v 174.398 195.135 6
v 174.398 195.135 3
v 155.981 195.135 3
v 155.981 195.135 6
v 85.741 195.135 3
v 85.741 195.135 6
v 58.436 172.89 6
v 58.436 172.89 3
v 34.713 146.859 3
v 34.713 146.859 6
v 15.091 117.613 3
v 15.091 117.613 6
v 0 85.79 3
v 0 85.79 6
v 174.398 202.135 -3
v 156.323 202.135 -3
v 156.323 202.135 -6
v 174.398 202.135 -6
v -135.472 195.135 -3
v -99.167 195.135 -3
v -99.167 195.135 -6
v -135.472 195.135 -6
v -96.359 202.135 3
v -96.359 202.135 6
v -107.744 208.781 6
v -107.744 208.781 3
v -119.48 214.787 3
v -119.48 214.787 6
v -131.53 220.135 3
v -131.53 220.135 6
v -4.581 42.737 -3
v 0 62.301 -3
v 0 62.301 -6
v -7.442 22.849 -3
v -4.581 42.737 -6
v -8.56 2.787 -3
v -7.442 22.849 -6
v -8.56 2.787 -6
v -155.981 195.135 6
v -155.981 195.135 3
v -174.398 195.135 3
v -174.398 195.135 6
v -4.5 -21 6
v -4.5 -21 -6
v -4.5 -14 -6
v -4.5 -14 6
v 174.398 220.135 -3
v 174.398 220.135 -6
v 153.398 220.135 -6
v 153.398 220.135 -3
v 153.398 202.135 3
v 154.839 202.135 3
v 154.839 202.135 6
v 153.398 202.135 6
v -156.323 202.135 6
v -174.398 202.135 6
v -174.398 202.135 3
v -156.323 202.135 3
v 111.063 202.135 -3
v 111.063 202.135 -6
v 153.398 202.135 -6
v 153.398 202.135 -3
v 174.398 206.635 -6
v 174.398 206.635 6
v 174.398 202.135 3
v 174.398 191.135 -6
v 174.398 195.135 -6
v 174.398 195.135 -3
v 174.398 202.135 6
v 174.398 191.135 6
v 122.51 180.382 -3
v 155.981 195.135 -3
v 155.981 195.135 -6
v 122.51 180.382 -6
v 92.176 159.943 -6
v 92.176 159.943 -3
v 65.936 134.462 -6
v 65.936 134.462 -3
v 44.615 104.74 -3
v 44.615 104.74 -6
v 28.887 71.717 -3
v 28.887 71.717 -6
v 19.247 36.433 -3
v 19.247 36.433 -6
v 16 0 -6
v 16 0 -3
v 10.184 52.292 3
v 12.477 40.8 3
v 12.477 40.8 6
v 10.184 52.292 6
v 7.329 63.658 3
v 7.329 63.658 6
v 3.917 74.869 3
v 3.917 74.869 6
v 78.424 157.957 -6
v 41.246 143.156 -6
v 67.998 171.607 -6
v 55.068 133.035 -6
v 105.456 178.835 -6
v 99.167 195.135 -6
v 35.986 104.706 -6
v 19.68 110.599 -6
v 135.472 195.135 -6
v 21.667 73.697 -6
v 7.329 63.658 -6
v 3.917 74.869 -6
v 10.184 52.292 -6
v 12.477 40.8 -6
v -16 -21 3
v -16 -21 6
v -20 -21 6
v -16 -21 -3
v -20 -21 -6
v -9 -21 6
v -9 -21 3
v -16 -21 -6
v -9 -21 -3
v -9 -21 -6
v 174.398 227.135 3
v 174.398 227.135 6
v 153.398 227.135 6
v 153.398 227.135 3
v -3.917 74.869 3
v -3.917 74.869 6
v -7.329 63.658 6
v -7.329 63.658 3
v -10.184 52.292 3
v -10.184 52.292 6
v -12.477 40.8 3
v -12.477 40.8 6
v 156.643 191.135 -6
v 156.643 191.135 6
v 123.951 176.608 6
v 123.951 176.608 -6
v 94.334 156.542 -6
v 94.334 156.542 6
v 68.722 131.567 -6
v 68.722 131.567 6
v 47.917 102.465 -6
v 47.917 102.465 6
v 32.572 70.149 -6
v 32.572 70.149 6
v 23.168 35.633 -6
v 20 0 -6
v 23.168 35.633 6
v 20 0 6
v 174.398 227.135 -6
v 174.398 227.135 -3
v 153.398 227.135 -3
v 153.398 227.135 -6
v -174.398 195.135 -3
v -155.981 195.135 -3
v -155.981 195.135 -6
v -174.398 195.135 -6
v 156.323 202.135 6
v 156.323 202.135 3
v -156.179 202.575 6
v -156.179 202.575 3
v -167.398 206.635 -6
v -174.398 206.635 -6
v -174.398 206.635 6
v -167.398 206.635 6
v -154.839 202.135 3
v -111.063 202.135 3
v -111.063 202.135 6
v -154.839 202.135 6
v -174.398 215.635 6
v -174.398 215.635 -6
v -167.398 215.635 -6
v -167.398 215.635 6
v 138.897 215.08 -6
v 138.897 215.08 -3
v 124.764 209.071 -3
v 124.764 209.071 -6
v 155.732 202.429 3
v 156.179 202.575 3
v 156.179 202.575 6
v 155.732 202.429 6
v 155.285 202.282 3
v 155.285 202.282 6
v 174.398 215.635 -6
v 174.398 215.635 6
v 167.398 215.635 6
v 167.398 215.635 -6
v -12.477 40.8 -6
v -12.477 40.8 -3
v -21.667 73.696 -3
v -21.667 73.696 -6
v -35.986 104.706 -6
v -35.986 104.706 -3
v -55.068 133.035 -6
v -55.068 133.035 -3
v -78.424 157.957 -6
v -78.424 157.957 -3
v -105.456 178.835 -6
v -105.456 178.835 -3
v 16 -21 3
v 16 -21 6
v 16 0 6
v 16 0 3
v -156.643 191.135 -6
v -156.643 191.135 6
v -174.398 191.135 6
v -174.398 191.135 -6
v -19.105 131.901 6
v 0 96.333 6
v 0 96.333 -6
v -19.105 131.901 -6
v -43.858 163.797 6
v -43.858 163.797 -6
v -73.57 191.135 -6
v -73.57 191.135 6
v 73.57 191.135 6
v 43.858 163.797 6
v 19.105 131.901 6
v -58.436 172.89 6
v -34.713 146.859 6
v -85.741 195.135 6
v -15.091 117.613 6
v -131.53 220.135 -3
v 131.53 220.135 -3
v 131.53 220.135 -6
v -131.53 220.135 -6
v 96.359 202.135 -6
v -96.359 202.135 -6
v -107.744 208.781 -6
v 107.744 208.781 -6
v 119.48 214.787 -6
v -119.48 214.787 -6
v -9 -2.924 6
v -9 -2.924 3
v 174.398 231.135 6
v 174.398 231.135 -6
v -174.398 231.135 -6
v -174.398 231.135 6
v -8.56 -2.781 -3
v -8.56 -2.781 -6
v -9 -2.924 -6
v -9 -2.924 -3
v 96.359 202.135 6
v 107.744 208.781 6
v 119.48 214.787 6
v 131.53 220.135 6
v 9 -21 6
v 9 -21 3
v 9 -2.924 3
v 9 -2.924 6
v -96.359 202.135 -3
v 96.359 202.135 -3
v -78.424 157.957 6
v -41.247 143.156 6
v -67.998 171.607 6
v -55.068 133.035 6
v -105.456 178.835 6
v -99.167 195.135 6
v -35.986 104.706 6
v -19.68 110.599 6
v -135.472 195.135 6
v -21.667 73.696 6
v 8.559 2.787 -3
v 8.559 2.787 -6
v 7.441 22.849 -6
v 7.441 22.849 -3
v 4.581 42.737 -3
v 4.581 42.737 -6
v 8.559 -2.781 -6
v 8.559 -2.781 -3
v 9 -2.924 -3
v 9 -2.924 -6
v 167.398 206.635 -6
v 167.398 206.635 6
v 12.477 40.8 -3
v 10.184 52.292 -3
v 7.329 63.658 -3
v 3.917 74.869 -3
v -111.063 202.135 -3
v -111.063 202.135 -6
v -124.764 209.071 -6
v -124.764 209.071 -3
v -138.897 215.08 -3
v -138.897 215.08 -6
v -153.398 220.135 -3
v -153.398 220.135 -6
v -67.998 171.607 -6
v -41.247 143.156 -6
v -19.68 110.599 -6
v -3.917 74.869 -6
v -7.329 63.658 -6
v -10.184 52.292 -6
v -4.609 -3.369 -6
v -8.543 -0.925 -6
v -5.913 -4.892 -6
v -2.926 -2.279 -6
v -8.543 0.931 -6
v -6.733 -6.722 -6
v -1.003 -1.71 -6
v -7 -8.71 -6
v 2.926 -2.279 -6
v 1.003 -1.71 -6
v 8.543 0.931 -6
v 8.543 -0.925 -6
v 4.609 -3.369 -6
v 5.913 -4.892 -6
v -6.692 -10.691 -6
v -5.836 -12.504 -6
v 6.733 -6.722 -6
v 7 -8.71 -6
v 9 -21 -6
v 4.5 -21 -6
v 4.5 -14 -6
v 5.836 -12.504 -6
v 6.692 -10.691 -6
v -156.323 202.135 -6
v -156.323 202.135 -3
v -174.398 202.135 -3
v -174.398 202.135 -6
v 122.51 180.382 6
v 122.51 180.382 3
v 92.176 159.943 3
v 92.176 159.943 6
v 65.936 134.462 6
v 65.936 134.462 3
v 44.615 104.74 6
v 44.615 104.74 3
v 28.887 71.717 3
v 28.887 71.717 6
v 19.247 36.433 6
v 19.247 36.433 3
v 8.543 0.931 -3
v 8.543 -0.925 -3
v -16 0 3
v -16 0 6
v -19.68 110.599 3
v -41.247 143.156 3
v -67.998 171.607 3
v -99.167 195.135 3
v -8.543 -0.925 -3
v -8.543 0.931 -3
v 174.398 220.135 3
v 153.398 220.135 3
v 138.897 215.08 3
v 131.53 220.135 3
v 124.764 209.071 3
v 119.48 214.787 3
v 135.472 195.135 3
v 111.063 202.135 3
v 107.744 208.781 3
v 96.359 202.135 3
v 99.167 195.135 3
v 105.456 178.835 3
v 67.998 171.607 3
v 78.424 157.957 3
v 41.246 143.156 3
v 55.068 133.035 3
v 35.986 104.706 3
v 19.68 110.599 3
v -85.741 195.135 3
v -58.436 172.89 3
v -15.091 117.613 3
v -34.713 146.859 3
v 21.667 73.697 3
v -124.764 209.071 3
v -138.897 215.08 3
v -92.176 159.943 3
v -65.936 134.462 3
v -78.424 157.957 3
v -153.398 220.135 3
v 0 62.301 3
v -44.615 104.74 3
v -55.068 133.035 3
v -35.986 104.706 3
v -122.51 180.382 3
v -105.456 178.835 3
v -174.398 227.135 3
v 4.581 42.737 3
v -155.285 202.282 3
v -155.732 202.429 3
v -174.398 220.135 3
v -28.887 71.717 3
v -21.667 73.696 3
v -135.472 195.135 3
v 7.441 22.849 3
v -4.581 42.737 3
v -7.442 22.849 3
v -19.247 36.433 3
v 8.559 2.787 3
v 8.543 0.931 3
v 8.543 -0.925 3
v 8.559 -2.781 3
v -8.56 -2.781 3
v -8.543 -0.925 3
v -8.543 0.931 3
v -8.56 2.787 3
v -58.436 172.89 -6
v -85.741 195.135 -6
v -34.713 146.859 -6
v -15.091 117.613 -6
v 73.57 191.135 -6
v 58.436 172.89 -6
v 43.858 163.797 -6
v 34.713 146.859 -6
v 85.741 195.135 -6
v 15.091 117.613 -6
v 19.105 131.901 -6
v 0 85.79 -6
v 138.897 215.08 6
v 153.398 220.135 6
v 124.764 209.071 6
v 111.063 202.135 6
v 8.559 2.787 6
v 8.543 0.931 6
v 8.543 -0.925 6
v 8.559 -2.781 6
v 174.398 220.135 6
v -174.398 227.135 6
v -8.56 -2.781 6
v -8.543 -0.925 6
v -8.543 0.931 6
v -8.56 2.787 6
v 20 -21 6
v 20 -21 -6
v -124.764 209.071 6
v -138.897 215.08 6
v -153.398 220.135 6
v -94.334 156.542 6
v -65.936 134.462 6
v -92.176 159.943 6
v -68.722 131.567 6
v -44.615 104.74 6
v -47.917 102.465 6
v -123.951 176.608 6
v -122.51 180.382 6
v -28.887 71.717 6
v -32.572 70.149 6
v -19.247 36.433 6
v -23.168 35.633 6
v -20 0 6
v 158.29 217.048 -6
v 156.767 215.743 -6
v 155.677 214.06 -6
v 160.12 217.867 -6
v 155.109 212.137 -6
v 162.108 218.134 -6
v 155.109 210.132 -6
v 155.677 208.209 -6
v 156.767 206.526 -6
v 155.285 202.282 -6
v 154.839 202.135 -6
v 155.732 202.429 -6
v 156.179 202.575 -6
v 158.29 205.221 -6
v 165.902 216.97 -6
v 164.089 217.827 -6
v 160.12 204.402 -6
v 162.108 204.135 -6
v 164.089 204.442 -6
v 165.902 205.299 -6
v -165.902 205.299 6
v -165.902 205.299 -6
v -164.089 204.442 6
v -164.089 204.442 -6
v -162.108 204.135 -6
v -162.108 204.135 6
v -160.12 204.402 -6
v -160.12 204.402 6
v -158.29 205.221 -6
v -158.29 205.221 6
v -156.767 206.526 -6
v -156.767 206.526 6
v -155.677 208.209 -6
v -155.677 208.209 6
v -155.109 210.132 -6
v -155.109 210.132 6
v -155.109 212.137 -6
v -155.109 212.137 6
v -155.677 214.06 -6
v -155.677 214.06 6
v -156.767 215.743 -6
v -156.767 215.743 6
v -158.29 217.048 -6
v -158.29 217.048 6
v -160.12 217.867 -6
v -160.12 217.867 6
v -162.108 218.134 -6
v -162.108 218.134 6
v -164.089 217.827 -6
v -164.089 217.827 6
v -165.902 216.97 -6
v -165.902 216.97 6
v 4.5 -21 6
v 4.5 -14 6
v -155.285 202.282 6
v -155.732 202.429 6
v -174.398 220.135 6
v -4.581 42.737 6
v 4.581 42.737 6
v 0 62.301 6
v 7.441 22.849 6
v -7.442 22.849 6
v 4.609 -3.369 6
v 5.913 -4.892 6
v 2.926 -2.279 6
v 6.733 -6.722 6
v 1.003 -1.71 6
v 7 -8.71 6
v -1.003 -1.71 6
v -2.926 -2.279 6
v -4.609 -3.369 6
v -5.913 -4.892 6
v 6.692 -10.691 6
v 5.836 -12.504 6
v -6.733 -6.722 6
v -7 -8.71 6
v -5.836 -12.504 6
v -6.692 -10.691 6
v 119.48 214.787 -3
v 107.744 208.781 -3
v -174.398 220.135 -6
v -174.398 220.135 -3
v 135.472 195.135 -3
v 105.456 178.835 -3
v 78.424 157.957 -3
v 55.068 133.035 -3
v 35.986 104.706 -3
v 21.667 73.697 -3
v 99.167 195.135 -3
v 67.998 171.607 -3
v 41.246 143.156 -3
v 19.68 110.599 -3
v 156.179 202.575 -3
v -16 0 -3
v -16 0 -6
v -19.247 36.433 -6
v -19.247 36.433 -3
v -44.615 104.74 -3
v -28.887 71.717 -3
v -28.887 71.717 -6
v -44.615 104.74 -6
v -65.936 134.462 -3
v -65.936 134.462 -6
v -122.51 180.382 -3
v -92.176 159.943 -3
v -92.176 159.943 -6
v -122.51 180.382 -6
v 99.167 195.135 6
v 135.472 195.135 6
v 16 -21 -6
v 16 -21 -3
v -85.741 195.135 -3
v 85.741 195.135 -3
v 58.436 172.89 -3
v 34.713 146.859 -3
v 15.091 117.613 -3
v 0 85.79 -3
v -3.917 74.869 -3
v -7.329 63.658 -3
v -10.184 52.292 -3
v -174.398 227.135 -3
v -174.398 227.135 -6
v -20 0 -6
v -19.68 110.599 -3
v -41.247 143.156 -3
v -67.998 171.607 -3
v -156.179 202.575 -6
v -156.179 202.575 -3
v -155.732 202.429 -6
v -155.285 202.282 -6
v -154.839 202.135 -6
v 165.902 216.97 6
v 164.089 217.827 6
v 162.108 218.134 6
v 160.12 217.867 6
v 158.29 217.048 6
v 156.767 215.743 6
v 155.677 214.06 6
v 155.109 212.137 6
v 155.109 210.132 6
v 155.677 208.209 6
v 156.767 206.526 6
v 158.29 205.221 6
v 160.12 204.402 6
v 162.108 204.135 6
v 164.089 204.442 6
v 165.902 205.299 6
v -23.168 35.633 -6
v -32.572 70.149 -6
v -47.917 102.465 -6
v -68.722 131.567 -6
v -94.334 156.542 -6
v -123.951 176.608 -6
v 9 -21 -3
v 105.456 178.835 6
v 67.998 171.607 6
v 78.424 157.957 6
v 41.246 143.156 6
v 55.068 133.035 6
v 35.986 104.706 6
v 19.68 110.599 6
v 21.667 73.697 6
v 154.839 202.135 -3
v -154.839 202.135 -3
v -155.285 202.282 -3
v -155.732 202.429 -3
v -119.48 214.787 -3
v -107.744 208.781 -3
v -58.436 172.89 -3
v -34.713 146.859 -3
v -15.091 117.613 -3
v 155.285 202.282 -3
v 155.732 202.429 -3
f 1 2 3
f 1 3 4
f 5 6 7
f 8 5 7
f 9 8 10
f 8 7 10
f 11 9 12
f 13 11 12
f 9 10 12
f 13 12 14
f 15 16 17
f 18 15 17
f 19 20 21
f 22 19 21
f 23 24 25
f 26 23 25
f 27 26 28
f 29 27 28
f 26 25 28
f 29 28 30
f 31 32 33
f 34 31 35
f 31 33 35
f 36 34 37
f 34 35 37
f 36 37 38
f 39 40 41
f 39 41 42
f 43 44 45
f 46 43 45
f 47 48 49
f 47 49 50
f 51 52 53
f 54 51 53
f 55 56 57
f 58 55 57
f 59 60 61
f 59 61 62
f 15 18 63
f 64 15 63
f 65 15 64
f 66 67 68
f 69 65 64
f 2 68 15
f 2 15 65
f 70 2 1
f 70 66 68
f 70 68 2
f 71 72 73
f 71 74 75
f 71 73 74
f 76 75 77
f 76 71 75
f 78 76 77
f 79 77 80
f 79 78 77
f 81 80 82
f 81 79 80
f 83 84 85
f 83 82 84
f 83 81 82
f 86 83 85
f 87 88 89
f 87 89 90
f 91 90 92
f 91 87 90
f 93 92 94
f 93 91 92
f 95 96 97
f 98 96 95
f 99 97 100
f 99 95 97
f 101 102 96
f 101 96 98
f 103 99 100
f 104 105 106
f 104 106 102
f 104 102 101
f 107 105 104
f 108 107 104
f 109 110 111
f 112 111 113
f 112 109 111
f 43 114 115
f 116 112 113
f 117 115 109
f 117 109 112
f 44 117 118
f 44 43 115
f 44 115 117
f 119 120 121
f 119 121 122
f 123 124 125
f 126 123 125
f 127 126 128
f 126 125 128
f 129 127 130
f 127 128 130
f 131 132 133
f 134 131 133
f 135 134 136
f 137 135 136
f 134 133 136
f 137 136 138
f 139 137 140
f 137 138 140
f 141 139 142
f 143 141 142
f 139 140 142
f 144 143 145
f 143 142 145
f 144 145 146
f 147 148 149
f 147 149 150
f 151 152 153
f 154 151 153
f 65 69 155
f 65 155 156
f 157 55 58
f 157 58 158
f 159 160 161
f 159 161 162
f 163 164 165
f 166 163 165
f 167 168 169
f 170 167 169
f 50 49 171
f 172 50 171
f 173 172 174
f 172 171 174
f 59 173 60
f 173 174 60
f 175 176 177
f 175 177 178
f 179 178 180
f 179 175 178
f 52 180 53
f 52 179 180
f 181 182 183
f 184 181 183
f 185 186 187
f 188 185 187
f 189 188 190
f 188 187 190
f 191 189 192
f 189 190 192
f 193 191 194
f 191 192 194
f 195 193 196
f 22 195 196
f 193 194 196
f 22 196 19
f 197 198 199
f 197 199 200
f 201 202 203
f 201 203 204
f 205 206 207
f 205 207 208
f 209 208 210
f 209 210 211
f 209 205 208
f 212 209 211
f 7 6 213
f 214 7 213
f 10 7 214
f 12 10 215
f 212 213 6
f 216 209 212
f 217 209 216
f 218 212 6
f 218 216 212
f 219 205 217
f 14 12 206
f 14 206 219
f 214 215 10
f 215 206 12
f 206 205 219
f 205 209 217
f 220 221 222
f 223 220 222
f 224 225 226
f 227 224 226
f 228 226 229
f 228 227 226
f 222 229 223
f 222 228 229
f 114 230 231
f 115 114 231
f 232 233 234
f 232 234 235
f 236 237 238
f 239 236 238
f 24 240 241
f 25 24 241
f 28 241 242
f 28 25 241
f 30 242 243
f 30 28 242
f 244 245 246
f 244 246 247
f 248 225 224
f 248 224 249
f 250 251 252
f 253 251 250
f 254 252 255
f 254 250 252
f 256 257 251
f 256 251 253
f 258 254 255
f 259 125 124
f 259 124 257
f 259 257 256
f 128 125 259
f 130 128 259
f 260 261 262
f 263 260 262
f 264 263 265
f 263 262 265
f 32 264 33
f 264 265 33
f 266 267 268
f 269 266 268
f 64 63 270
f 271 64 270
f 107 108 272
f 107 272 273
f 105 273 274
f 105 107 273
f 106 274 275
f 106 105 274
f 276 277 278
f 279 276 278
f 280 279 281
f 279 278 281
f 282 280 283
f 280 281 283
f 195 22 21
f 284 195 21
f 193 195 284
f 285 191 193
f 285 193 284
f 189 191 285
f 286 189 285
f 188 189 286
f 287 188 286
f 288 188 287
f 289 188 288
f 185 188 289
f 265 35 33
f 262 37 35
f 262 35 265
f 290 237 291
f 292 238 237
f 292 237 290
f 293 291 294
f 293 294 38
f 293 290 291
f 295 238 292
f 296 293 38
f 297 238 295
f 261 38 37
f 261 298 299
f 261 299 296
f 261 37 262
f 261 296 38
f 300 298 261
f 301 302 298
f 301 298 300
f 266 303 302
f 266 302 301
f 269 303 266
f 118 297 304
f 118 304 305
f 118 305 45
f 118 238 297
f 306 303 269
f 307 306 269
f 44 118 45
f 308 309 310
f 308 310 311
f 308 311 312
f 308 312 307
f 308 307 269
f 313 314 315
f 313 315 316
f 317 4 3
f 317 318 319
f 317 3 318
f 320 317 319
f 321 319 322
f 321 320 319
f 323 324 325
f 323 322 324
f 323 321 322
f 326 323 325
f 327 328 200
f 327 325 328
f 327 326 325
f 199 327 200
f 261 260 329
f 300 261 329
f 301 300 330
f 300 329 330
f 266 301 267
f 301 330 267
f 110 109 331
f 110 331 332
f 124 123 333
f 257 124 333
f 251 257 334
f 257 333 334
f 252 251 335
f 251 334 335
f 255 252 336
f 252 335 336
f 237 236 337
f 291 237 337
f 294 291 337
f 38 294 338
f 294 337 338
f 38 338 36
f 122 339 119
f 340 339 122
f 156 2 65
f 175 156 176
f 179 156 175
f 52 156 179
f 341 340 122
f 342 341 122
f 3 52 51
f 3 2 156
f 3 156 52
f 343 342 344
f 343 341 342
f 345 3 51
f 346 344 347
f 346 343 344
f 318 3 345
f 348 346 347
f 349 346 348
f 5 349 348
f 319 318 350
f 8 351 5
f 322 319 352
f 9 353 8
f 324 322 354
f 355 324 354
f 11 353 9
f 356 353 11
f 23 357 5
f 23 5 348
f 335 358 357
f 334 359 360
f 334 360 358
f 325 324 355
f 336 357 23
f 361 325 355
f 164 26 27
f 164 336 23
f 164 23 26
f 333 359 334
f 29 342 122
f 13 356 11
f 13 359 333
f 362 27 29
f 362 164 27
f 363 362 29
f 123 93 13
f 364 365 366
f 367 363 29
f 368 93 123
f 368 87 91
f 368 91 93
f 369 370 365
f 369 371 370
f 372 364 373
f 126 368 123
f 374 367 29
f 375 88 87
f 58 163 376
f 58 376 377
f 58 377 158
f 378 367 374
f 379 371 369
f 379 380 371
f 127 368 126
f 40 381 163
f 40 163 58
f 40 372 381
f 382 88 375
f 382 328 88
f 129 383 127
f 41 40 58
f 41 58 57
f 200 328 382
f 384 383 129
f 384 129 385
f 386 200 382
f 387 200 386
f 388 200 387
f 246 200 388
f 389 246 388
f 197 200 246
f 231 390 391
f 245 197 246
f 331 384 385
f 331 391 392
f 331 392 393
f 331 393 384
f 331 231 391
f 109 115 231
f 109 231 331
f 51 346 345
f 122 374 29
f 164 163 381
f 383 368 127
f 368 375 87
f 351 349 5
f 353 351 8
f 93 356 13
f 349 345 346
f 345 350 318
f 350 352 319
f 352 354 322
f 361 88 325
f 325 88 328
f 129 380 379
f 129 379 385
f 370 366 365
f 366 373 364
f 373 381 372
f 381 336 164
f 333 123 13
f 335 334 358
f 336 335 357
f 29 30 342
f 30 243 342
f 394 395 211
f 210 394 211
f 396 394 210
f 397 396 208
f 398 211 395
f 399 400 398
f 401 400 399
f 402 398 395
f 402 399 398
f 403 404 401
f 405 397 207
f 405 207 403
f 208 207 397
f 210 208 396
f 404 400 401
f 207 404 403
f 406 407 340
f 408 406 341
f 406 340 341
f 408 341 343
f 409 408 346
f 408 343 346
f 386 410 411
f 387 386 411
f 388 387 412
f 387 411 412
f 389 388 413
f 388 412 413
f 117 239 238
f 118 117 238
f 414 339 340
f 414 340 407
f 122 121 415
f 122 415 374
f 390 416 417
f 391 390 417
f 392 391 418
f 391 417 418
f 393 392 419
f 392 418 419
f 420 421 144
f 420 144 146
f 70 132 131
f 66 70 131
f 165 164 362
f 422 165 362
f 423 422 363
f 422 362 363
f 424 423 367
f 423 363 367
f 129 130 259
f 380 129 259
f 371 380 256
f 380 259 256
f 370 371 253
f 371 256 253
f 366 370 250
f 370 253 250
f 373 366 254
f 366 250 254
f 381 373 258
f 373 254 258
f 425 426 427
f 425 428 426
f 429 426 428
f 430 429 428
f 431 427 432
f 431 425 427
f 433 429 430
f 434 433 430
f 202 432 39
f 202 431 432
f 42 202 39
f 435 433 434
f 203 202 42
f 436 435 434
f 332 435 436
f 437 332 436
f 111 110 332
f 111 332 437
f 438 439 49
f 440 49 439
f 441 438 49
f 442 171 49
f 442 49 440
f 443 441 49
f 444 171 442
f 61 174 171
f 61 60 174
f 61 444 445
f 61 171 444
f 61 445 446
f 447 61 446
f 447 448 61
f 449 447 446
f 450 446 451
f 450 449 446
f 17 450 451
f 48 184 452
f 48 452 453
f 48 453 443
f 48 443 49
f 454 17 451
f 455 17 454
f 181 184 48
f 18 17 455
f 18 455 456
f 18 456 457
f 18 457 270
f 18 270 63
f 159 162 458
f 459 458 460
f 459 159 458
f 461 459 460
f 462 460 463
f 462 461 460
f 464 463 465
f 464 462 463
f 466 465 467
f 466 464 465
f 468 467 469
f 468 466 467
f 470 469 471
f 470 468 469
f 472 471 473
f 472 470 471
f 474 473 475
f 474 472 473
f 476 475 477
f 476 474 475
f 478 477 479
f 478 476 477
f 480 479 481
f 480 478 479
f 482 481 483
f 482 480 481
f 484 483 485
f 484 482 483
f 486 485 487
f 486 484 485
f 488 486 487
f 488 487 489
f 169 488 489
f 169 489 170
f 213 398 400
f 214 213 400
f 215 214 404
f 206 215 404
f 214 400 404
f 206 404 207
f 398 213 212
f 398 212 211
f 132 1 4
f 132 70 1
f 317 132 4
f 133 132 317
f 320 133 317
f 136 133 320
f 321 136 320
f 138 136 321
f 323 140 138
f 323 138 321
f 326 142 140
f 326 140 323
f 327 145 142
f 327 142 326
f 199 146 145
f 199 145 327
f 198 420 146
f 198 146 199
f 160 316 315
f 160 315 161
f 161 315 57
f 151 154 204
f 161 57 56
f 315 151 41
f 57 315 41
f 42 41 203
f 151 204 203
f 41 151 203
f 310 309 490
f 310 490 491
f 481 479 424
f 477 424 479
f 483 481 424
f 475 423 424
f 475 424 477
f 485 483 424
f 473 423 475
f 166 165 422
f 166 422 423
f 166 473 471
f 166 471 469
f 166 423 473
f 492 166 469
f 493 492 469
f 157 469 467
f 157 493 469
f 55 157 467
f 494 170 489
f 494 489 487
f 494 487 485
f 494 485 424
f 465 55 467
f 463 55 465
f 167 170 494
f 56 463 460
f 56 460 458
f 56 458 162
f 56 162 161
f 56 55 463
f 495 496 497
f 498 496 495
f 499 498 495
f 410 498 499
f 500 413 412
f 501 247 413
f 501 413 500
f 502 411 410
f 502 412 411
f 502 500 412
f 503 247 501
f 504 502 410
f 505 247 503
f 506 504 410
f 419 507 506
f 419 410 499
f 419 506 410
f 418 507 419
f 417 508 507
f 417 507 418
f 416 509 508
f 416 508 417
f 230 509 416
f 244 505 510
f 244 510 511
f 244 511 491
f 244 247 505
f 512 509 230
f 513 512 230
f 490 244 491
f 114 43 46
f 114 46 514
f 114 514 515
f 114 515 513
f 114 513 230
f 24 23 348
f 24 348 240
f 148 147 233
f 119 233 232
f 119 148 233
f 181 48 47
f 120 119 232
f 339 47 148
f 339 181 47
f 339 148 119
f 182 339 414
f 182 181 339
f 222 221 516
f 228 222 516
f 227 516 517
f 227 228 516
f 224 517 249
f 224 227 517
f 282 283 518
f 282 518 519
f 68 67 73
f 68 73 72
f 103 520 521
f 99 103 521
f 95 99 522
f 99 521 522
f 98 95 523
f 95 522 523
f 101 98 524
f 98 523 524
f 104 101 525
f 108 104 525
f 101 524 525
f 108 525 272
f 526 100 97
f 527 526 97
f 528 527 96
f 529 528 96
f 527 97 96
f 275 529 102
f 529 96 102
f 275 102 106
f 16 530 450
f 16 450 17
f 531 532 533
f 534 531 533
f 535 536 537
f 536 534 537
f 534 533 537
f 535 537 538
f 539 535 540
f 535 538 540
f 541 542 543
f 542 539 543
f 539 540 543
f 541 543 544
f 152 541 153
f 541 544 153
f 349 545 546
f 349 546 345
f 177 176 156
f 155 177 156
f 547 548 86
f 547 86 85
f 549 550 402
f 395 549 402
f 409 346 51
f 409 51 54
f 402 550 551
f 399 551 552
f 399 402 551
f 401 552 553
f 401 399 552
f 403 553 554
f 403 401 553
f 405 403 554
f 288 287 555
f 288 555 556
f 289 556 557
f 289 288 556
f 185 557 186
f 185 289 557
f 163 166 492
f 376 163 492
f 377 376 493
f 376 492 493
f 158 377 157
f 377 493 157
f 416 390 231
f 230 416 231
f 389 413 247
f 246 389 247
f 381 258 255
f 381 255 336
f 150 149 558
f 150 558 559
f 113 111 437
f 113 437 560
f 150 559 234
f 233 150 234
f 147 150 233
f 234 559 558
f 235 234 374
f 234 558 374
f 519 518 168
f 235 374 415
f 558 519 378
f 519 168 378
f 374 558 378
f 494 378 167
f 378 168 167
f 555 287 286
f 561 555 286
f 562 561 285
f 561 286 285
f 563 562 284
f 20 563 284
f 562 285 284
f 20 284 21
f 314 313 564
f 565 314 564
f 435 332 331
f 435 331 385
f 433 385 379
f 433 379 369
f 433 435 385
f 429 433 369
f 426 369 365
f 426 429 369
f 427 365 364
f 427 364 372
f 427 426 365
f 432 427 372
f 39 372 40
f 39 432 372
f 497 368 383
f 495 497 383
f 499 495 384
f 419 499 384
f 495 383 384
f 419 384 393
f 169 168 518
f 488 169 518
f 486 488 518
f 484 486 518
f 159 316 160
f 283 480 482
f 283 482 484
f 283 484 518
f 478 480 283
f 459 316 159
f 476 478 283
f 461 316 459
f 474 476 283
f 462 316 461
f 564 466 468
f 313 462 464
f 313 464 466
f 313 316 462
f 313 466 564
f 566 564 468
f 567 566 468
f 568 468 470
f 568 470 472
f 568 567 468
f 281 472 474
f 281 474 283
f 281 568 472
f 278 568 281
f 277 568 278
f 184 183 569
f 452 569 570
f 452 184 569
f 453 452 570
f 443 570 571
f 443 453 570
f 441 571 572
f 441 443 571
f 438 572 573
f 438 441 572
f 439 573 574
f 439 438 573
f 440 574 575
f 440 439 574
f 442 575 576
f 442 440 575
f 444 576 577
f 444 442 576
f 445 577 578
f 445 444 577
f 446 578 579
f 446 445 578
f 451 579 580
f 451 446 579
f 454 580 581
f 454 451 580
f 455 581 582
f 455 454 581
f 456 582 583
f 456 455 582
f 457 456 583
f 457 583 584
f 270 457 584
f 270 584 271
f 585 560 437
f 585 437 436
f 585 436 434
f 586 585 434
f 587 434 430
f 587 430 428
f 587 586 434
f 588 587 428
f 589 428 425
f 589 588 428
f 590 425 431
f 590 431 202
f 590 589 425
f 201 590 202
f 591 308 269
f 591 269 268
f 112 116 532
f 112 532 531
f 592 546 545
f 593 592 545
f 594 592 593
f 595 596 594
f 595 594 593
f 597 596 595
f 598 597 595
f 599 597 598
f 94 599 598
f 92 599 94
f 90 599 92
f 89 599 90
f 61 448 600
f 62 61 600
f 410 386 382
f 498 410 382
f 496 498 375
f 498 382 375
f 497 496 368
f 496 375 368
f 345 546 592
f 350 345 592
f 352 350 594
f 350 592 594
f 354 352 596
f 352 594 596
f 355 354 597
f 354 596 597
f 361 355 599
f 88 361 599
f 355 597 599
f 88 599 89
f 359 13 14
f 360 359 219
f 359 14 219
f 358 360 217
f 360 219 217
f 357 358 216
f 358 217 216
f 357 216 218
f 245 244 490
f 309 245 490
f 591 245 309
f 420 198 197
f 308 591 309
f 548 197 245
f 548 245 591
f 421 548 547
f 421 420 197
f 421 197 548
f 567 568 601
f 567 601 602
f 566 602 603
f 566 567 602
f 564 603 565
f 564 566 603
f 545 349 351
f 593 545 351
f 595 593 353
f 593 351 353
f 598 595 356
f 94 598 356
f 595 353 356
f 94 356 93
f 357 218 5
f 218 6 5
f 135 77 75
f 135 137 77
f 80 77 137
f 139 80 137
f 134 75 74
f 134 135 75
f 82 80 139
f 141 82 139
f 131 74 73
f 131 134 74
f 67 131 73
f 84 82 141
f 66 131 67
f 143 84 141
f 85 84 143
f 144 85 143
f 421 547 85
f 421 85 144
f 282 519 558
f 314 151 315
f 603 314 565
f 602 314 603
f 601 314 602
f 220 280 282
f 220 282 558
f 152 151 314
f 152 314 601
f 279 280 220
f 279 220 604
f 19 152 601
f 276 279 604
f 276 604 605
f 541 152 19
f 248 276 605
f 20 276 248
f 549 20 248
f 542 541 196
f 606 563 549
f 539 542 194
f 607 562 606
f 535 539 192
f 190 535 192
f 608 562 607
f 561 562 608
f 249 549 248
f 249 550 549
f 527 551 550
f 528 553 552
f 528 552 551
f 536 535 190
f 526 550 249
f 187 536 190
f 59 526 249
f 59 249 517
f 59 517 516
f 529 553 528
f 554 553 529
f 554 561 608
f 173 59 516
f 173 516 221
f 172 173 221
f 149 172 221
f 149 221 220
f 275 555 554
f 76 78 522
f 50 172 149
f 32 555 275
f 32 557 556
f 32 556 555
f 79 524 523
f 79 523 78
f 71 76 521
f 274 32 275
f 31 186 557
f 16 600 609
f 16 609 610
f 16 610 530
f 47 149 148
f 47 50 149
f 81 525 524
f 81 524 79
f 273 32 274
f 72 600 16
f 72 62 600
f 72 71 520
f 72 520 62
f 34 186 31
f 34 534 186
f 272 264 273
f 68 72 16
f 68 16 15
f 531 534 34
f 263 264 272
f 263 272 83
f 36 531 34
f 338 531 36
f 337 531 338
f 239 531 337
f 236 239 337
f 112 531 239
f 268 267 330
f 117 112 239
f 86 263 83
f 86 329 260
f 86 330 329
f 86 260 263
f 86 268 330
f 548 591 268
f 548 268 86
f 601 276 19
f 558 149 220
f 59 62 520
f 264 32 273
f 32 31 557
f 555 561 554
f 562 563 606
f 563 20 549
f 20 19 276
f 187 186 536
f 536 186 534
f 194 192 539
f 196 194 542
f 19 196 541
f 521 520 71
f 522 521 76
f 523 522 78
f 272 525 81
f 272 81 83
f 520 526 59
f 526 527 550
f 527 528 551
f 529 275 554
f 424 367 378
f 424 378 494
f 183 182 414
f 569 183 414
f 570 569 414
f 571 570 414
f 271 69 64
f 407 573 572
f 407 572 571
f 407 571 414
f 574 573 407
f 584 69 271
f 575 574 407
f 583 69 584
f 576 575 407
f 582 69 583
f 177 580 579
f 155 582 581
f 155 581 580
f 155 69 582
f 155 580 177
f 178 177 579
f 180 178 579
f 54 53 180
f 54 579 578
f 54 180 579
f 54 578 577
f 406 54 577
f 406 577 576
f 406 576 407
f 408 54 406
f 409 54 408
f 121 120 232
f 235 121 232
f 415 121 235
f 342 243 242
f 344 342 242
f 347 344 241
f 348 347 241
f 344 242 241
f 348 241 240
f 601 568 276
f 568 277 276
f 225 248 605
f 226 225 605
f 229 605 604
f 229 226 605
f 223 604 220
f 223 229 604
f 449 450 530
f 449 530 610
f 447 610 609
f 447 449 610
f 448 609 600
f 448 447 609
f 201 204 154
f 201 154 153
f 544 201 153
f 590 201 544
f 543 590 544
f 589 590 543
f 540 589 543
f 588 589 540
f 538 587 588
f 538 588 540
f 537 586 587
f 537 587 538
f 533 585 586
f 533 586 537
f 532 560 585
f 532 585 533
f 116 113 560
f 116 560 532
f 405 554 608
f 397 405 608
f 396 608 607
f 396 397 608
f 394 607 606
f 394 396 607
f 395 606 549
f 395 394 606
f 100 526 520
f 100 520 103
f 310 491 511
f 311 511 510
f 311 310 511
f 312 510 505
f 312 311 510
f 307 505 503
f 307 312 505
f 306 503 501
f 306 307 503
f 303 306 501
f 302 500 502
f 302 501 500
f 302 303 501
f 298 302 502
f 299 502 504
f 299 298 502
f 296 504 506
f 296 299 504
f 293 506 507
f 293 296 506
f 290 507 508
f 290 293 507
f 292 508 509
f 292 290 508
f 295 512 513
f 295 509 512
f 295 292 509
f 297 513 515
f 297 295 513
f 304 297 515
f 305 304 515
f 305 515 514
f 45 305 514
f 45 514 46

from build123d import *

# Parameters (mm, degrees)
SKETCH006_W          = 7
SKETCH006_H          = 3
SKETCH007_W          = 7
SKETCH007_H          = 3
SKETCH008_W          = 7
SKETCH008_H          = 3
SKETCH009_W          = 7
SKETCH009_H          = 3
SKETCH010_W          = 7
SKETCH010_H          = 3
SKETCH011_W          = 7
SKETCH011_H          = 3
SKETCH012_W          = 7
SKETCH012_H          = 3
SKETCH013_W          = 7
SKETCH013_H          = 3
SKETCH014_W          = 7
SKETCH014_H          = 3
SKETCH015_W          = 7
SKETCH015_H          = 3
SKETCH016_W          = 7
SKETCH016_H          = 3
SKETCH017_W          = 7
SKETCH017_H          = 3
POCKET_DEPTH         = 6.001
POCKET_DEPTH_BACK    = 6.001
POCKET001_DEPTH      = 6.001
POCKET001_DEPTH_BACK = 6.001
POCKET002_DEPTH      = 6.001
POCKET002_DEPTH_BACK = 6.001


with BuildPart() as part:
    # AdditivePipe: sweep along a path in Sketch
    with BuildLine(Plane.XY) as additivepipe_path:
        ThreePointArc((0, 0), (-42.398227, 130.488326), (-153.398227, 211.134547))
    # Sketch003 (on DatumPlane) → AdditivePipe (sweep)
    with BuildSketch(Plane.XZ):
        Polygon((-20, 6), (-20, -6), (-16, -6), (-16, -3), (-9, -3), (-9, -6), (9, -6), (9, -3), (16, -3), (16, -6), (20, -6), (20, 6), (16, 6), (16, 3), (9, 3), (9, 6), (-9, 6), (-9, 3), (-16, 3), (-16, 6), align=None)
    sweep(path=additivepipe_path.line)

    # AdditivePipe001: sweep along a path in Sketch001
    with BuildLine(Plane.XY) as additivepipe001_path:
        ThreePointArc((153.398227, 211.134547), (42.398227, 130.488326), (0, 0))
    # Sketch003 (on DatumPlane) → AdditivePipe001 (sweep)
    with BuildSketch(Plane.XZ):
        Polygon((-20, 6), (-20, -6), (-16, -6), (-16, -3), (-9, -3), (-9, -6), (9, -6), (9, -3), (16, -3), (16, -6), (20, -6), (20, 6), (16, 6), (16, 3), (9, 3), (9, 6), (-9, 6), (-9, 3), (-16, 3), (-16, 6), align=None)
    sweep(path=additivepipe001_path.line)

    # AdditivePipe002: sweep along a path in Sketch002
    with BuildLine(Plane.XY) as additivepipe002_path:
        Line((-174.398227, 211.134547), (-153.398227, 211.134547))
        Line((-153.398227, 211.134547), (153.398227, 211.134547))
        Line((153.398227, 211.134547), (174.398227, 211.134547))
    # Sketch004 (on DatumPlane) → AdditivePipe002 (sweep)
    with BuildSketch(Plane(origin=(-153.398227, 211.134547, 0), x_dir=(0, 1, 0), z_dir=(1, 0, 0))):
        Polygon((-20, 6), (-20, -6), (-16, -6), (-16, -3), (-9, -3), (-9, -6), (9, -6), (9, -3), (16, -3), (16, -6), (20, -6), (20, 6), (16, 6), (16, 3), (9, 3), (9, 6), (-9, 6), (-9, 3), (-16, 3), (-16, 6), align=None)
    sweep(path=additivepipe002_path.line)

    # AdditivePipe003: sweep along a path in Sketch005
    with BuildLine(Plane.XY) as additivepipe003_path:
        Line((0, 0), (0, -21))
    # Sketch003 (on DatumPlane) → AdditivePipe003 (sweep)
    with BuildSketch(Plane.XZ):
        Polygon((-20, 6), (-20, -6), (-16, -6), (-16, -3), (-9, -3), (-9, -6), (9, -6), (9, -3), (16, -3), (16, -6), (20, -6), (20, 6), (16, 6), (16, 3), (9, 3), (9, 6), (-9, 6), (-9, 3), (-16, 3), (-16, 6), align=None)
    sweep(path=additivepipe003_path.line)

    # SubtractivePipe: sweep along a path in Sketch
    with BuildLine(Plane.XY) as subtractivepipe_path:
        ThreePointArc((0, 0), (-42.398227, 130.488326), (-153.398227, 211.134547))
    # Sketch006 (on DatumPlane) → SubtractivePipe (sweep, cut)
    with BuildSketch(Plane.XZ):
        with Locations((-12.5, 4.5)):
            Rectangle(SKETCH006_W, SKETCH006_H)
    sweep(path=subtractivepipe_path.line, mode=Mode.SUBTRACT)

    # SubtractivePipe001: sweep along a path in Sketch001
    with BuildLine(Plane.XY) as subtractivepipe001_path:
        ThreePointArc((153.398227, 211.134547), (42.398227, 130.488326), (0, 0))
    # Sketch006 (on DatumPlane) → SubtractivePipe001 (sweep, cut)
    with BuildSketch(Plane.XZ):
        with Locations((-12.5, 4.5)):
            Rectangle(SKETCH006_W, SKETCH006_H)
    sweep(path=subtractivepipe001_path.line, mode=Mode.SUBTRACT)

    # SubtractivePipe002: sweep along a path in Sketch
    with BuildLine(Plane.XY) as subtractivepipe002_path:
        ThreePointArc((0, 0), (-42.398227, 130.488326), (-153.398227, 211.134547))
    # Sketch007 (on DatumPlane) → SubtractivePipe002 (sweep, cut)
    with BuildSketch(Plane.XZ):
        with Locations((12.5, 4.5)):
            Rectangle(SKETCH007_W, SKETCH007_H)
    sweep(path=subtractivepipe002_path.line, mode=Mode.SUBTRACT)

    # SubtractivePipe003: sweep along a path in Sketch001
    with BuildLine(Plane.XY) as subtractivepipe003_path:
        ThreePointArc((153.398227, 211.134547), (42.398227, 130.488326), (0, 0))
    # Sketch007 (on DatumPlane) → SubtractivePipe003 (sweep, cut)
    with BuildSketch(Plane.XZ):
        with Locations((12.5, 4.5)):
            Rectangle(SKETCH007_W, SKETCH007_H)
    sweep(path=subtractivepipe003_path.line, mode=Mode.SUBTRACT)

    # SubtractivePipe004: sweep along a path in Sketch002
    with BuildLine(Plane.XY) as subtractivepipe004_path:
        Line((-174.398227, 211.134547), (-153.398227, 211.134547))
        Line((-153.398227, 211.134547), (153.398227, 211.134547))
        Line((153.398227, 211.134547), (174.398227, 211.134547))
    # Sketch008 (on DatumPlane) → SubtractivePipe004 (sweep, cut)
    with BuildSketch(Plane(origin=(-153.398227, 211.134547, 0), x_dir=(0, 1, 0), z_dir=(1, 0, 0))):
        with Locations((-12.5, 4.5)):
            Rectangle(SKETCH008_W, SKETCH008_H)
    sweep(path=subtractivepipe004_path.line, mode=Mode.SUBTRACT)

    # SubtractivePipe005: sweep along a path in Sketch002
    with BuildLine(Plane.XY) as subtractivepipe005_path:
        Line((-174.398227, 211.134547), (-153.398227, 211.134547))
        Line((-153.398227, 211.134547), (153.398227, 211.134547))
        Line((153.398227, 211.134547), (174.398227, 211.134547))
    # Sketch009 (on DatumPlane) → SubtractivePipe005 (sweep, cut)
    with BuildSketch(Plane(origin=(-153.398227, 211.134547, 0), x_dir=(0, 1, 0), z_dir=(1, 0, 0))):
        with Locations((12.5, 4.5)):
            Rectangle(SKETCH009_W, SKETCH009_H)
    sweep(path=subtractivepipe005_path.line, mode=Mode.SUBTRACT)

    # SubtractivePipe006: sweep along a path in Sketch
    with BuildLine(Plane.XY) as subtractivepipe006_path:
        ThreePointArc((0, 0), (-42.398227, 130.488326), (-153.398227, 211.134547))
    # Sketch009 (on DatumPlane) → SubtractivePipe006 (sweep, cut)
    with BuildSketch(Plane(origin=(-153.398227, 211.134547, 0), x_dir=(0, 1, 0), z_dir=(1, 0, 0))):
        with Locations((12.5, 4.5)):
            Rectangle(SKETCH009_W, SKETCH009_H)
    sweep(path=subtractivepipe006_path.line, mode=Mode.SUBTRACT)

    # SubtractivePipe007: sweep along a path in Sketch
    with BuildLine(Plane.XY) as subtractivepipe007_path:
        ThreePointArc((0, 0), (-42.398227, 130.488326), (-153.398227, 211.134547))
    # Sketch008 (on DatumPlane) → SubtractivePipe007 (sweep, cut)
    with BuildSketch(Plane(origin=(-153.398227, 211.134547, 0), x_dir=(0, 1, 0), z_dir=(1, 0, 0))):
        with Locations((-12.5, 4.5)):
            Rectangle(SKETCH008_W, SKETCH008_H)
    sweep(path=subtractivepipe007_path.line, mode=Mode.SUBTRACT)

    # SubtractivePipe008: sweep along a path in Sketch
    with BuildLine(Plane.XY) as subtractivepipe008_path:
        ThreePointArc((0, 0), (-42.398227, 130.488326), (-153.398227, 211.134547))
    # Sketch010 (on DatumPlane) → SubtractivePipe008 (sweep, cut)
    with BuildSketch(Plane.XZ):
        with Locations((-12.5, -4.5)):
            Rectangle(SKETCH010_W, SKETCH010_H)
    sweep(path=subtractivepipe008_path.line, mode=Mode.SUBTRACT)

    # SubtractivePipe009: sweep along a path in Sketch001
    with BuildLine(Plane.XY) as subtractivepipe009_path:
        ThreePointArc((153.398227, 211.134547), (42.398227, 130.488326), (0, 0))
    # Sketch010 (on DatumPlane) → SubtractivePipe009 (sweep, cut)
    with BuildSketch(Plane.XZ):
        with Locations((-12.5, -4.5)):
            Rectangle(SKETCH010_W, SKETCH010_H)
    sweep(path=subtractivepipe009_path.line, mode=Mode.SUBTRACT)

    # SubtractivePipe010: sweep along a path in Sketch
    with BuildLine(Plane.XY) as subtractivepipe010_path:
        ThreePointArc((0, 0), (-42.398227, 130.488326), (-153.398227, 211.134547))
    # Sketch011 (on DatumPlane) → SubtractivePipe010 (sweep, cut)
    with BuildSketch(Plane.XZ):
        with Locations((12.5, -4.5)):
            Rectangle(SKETCH011_W, SKETCH011_H)
    sweep(path=subtractivepipe010_path.line, mode=Mode.SUBTRACT)

    # SubtractivePipe011: sweep along a path in Sketch001
    with BuildLine(Plane.XY) as subtractivepipe011_path:
        ThreePointArc((153.398227, 211.134547), (42.398227, 130.488326), (0, 0))
    # Sketch011 (on DatumPlane) → SubtractivePipe011 (sweep, cut)
    with BuildSketch(Plane.XZ):
        with Locations((12.5, -4.5)):
            Rectangle(SKETCH011_W, SKETCH011_H)
    sweep(path=subtractivepipe011_path.line, mode=Mode.SUBTRACT)

    # SubtractivePipe012: sweep along a path in Sketch
    with BuildLine(Plane.XY) as subtractivepipe012_path:
        ThreePointArc((0, 0), (-42.398227, 130.488326), (-153.398227, 211.134547))
    # Sketch012 (on DatumPlane) → SubtractivePipe012 (sweep, cut)
    with BuildSketch(Plane(origin=(-153.398227, 211.134547, 0), x_dir=(0, 1, 0), z_dir=(1, 0, 0))):
        with Locations((-12.5, -4.5)):
            Rectangle(SKETCH012_W, SKETCH012_H)
    sweep(path=subtractivepipe012_path.line, mode=Mode.SUBTRACT)

    # SubtractivePipe013: sweep along a path in Sketch002
    with BuildLine(Plane.XY) as subtractivepipe013_path:
        Line((-174.398227, 211.134547), (-153.398227, 211.134547))
        Line((-153.398227, 211.134547), (153.398227, 211.134547))
        Line((153.398227, 211.134547), (174.398227, 211.134547))
    # Sketch012 (on DatumPlane) → SubtractivePipe013 (sweep, cut)
    with BuildSketch(Plane(origin=(-153.398227, 211.134547, 0), x_dir=(0, 1, 0), z_dir=(1, 0, 0))):
        with Locations((-12.5, -4.5)):
            Rectangle(SKETCH012_W, SKETCH012_H)
    sweep(path=subtractivepipe013_path.line, mode=Mode.SUBTRACT)

    # SubtractivePipe014: sweep along a path in Sketch
    with BuildLine(Plane.XY) as subtractivepipe014_path:
        ThreePointArc((0, 0), (-42.398227, 130.488326), (-153.398227, 211.134547))
    # Sketch013 (on DatumPlane) → SubtractivePipe014 (sweep, cut)
    with BuildSketch(Plane(origin=(-153.398227, 211.134547, 0), x_dir=(0, 1, 0), z_dir=(1, 0, 0))):
        with Locations((12.5, -4.5)):
            Rectangle(SKETCH013_W, SKETCH013_H)
    sweep(path=subtractivepipe014_path.line, mode=Mode.SUBTRACT)

    # SubtractivePipe015: sweep along a path in Sketch002
    with BuildLine(Plane.XY) as subtractivepipe015_path:
        Line((-174.398227, 211.134547), (-153.398227, 211.134547))
        Line((-153.398227, 211.134547), (153.398227, 211.134547))
        Line((153.398227, 211.134547), (174.398227, 211.134547))
    # Sketch013 (on DatumPlane) → SubtractivePipe015 (sweep, cut)
    with BuildSketch(Plane(origin=(-153.398227, 211.134547, 0), x_dir=(0, 1, 0), z_dir=(1, 0, 0))):
        with Locations((12.5, -4.5)):
            Rectangle(SKETCH013_W, SKETCH013_H)
    sweep(path=subtractivepipe015_path.line, mode=Mode.SUBTRACT)

    # SubtractivePipe016: sweep along a path in Sketch001
    with BuildLine(Plane.XY) as subtractivepipe016_path:
        ThreePointArc((153.398227, 211.134547), (42.398227, 130.488326), (0, 0))
    # Sketch014 (on DatumPlane) → SubtractivePipe016 (sweep, cut)
    with BuildSketch(Plane(origin=(153.397773, 517.930547, 0), x_dir=(0, 1, 0), z_dir=(1, 0, 0))):
        with Locations((-319.296, 4.5)):
            Rectangle(SKETCH014_W, SKETCH014_H)
    sweep(path=subtractivepipe016_path.line, mode=Mode.SUBTRACT)

    # SubtractivePipe017: sweep along a path in Sketch001
    with BuildLine(Plane.XY) as subtractivepipe017_path:
        ThreePointArc((153.398227, 211.134547), (42.398227, 130.488326), (0, 0))
    # Sketch015 (on DatumPlane) → SubtractivePipe017 (sweep, cut)
    with BuildSketch(Plane(origin=(153.397773, 517.930547, 0), x_dir=(0, 1, 0), z_dir=(1, 0, 0))):
        with Locations((-294.296, 4.5)):
            Rectangle(SKETCH015_W, SKETCH015_H)
    sweep(path=subtractivepipe017_path.line, mode=Mode.SUBTRACT)

    # SubtractivePipe018: sweep along a path in Sketch001
    with BuildLine(Plane.XY) as subtractivepipe018_path:
        ThreePointArc((153.398227, 211.134547), (42.398227, 130.488326), (0, 0))
    # Sketch016 (on DatumPlane) → SubtractivePipe018 (sweep, cut)
    with BuildSketch(Plane(origin=(153.397773, 517.930547, 0), x_dir=(0, 1, 0), z_dir=(1, 0, 0))):
        with Locations((-319.296, -4.5)):
            Rectangle(SKETCH016_W, SKETCH016_H)
    sweep(path=subtractivepipe018_path.line, mode=Mode.SUBTRACT)

    # SubtractivePipe019: sweep along a path in Sketch001
    with BuildLine(Plane.XY) as subtractivepipe019_path:
        ThreePointArc((153.398227, 211.134547), (42.398227, 130.488326), (0, 0))
    # Sketch017 (on DatumPlane) → SubtractivePipe019 (sweep, cut)
    with BuildSketch(Plane(origin=(153.397773, 517.930547, 0), x_dir=(0, 1, 0), z_dir=(1, 0, 0))):
        with Locations((-294.296, -4.5)):
            Rectangle(SKETCH017_W, SKETCH017_H)
    sweep(path=subtractivepipe019_path.line, mode=Mode.SUBTRACT)

    # Sketch018 → Pocket (cut, two sides)
    with BuildSketch(Plane.XY) as pocket_sk:
        with BuildLine():
            Line((-174.398227, 206.634547), (-174.398227, 215.634547))
            Line((-174.398227, 215.634547), (-167.398227, 215.634547))
            ThreePointArc((-167.398227, 206.634547), (-155.036325, 211.134547), (-167.398227, 215.634547))
            Line((-174.398227, 206.634547), (-167.398227, 206.634547))
        make_face()
    extrude(amount=-POCKET_DEPTH, mode=Mode.SUBTRACT)
    extrude(pocket_sk.sketch, amount=POCKET_DEPTH_BACK, mode=Mode.SUBTRACT)

    # Sketch019 → Pocket001 (cut, two sides)
    with BuildSketch(Plane.XY) as pocket001_sk:
        with BuildLine():
            Line((174.398227, 206.634547), (174.398227, 215.634547))
            Line((174.398227, 215.634547), (167.398227, 215.634547))
            ThreePointArc((167.398227, 215.634547), (155.036325, 211.134547), (167.398227, 206.634547))
            Line((174.398227, 206.634547), (167.398227, 206.634547))
        make_face()
    extrude(amount=-POCKET001_DEPTH, mode=Mode.SUBTRACT)
    extrude(pocket001_sk.sketch, amount=POCKET001_DEPTH_BACK, mode=Mode.SUBTRACT)

    # Sketch020 → Pocket002 (cut, two sides)
    with BuildSketch(Plane.XY) as pocket002_sk:
        with BuildLine():
            Line((-4.5, -21), (4.5, -21))
            Line((4.5, -21), (4.5, -14))
            ThreePointArc((4.5, -14), (0, -1.638097), (-4.5, -14))
            Line((-4.5, -21), (-4.5, -14))
        make_face()
    extrude(amount=-POCKET002_DEPTH, mode=Mode.SUBTRACT)
    extrude(pocket002_sk.sketch, amount=POCKET002_DEPTH_BACK, mode=Mode.SUBTRACT)


solid = part.part
